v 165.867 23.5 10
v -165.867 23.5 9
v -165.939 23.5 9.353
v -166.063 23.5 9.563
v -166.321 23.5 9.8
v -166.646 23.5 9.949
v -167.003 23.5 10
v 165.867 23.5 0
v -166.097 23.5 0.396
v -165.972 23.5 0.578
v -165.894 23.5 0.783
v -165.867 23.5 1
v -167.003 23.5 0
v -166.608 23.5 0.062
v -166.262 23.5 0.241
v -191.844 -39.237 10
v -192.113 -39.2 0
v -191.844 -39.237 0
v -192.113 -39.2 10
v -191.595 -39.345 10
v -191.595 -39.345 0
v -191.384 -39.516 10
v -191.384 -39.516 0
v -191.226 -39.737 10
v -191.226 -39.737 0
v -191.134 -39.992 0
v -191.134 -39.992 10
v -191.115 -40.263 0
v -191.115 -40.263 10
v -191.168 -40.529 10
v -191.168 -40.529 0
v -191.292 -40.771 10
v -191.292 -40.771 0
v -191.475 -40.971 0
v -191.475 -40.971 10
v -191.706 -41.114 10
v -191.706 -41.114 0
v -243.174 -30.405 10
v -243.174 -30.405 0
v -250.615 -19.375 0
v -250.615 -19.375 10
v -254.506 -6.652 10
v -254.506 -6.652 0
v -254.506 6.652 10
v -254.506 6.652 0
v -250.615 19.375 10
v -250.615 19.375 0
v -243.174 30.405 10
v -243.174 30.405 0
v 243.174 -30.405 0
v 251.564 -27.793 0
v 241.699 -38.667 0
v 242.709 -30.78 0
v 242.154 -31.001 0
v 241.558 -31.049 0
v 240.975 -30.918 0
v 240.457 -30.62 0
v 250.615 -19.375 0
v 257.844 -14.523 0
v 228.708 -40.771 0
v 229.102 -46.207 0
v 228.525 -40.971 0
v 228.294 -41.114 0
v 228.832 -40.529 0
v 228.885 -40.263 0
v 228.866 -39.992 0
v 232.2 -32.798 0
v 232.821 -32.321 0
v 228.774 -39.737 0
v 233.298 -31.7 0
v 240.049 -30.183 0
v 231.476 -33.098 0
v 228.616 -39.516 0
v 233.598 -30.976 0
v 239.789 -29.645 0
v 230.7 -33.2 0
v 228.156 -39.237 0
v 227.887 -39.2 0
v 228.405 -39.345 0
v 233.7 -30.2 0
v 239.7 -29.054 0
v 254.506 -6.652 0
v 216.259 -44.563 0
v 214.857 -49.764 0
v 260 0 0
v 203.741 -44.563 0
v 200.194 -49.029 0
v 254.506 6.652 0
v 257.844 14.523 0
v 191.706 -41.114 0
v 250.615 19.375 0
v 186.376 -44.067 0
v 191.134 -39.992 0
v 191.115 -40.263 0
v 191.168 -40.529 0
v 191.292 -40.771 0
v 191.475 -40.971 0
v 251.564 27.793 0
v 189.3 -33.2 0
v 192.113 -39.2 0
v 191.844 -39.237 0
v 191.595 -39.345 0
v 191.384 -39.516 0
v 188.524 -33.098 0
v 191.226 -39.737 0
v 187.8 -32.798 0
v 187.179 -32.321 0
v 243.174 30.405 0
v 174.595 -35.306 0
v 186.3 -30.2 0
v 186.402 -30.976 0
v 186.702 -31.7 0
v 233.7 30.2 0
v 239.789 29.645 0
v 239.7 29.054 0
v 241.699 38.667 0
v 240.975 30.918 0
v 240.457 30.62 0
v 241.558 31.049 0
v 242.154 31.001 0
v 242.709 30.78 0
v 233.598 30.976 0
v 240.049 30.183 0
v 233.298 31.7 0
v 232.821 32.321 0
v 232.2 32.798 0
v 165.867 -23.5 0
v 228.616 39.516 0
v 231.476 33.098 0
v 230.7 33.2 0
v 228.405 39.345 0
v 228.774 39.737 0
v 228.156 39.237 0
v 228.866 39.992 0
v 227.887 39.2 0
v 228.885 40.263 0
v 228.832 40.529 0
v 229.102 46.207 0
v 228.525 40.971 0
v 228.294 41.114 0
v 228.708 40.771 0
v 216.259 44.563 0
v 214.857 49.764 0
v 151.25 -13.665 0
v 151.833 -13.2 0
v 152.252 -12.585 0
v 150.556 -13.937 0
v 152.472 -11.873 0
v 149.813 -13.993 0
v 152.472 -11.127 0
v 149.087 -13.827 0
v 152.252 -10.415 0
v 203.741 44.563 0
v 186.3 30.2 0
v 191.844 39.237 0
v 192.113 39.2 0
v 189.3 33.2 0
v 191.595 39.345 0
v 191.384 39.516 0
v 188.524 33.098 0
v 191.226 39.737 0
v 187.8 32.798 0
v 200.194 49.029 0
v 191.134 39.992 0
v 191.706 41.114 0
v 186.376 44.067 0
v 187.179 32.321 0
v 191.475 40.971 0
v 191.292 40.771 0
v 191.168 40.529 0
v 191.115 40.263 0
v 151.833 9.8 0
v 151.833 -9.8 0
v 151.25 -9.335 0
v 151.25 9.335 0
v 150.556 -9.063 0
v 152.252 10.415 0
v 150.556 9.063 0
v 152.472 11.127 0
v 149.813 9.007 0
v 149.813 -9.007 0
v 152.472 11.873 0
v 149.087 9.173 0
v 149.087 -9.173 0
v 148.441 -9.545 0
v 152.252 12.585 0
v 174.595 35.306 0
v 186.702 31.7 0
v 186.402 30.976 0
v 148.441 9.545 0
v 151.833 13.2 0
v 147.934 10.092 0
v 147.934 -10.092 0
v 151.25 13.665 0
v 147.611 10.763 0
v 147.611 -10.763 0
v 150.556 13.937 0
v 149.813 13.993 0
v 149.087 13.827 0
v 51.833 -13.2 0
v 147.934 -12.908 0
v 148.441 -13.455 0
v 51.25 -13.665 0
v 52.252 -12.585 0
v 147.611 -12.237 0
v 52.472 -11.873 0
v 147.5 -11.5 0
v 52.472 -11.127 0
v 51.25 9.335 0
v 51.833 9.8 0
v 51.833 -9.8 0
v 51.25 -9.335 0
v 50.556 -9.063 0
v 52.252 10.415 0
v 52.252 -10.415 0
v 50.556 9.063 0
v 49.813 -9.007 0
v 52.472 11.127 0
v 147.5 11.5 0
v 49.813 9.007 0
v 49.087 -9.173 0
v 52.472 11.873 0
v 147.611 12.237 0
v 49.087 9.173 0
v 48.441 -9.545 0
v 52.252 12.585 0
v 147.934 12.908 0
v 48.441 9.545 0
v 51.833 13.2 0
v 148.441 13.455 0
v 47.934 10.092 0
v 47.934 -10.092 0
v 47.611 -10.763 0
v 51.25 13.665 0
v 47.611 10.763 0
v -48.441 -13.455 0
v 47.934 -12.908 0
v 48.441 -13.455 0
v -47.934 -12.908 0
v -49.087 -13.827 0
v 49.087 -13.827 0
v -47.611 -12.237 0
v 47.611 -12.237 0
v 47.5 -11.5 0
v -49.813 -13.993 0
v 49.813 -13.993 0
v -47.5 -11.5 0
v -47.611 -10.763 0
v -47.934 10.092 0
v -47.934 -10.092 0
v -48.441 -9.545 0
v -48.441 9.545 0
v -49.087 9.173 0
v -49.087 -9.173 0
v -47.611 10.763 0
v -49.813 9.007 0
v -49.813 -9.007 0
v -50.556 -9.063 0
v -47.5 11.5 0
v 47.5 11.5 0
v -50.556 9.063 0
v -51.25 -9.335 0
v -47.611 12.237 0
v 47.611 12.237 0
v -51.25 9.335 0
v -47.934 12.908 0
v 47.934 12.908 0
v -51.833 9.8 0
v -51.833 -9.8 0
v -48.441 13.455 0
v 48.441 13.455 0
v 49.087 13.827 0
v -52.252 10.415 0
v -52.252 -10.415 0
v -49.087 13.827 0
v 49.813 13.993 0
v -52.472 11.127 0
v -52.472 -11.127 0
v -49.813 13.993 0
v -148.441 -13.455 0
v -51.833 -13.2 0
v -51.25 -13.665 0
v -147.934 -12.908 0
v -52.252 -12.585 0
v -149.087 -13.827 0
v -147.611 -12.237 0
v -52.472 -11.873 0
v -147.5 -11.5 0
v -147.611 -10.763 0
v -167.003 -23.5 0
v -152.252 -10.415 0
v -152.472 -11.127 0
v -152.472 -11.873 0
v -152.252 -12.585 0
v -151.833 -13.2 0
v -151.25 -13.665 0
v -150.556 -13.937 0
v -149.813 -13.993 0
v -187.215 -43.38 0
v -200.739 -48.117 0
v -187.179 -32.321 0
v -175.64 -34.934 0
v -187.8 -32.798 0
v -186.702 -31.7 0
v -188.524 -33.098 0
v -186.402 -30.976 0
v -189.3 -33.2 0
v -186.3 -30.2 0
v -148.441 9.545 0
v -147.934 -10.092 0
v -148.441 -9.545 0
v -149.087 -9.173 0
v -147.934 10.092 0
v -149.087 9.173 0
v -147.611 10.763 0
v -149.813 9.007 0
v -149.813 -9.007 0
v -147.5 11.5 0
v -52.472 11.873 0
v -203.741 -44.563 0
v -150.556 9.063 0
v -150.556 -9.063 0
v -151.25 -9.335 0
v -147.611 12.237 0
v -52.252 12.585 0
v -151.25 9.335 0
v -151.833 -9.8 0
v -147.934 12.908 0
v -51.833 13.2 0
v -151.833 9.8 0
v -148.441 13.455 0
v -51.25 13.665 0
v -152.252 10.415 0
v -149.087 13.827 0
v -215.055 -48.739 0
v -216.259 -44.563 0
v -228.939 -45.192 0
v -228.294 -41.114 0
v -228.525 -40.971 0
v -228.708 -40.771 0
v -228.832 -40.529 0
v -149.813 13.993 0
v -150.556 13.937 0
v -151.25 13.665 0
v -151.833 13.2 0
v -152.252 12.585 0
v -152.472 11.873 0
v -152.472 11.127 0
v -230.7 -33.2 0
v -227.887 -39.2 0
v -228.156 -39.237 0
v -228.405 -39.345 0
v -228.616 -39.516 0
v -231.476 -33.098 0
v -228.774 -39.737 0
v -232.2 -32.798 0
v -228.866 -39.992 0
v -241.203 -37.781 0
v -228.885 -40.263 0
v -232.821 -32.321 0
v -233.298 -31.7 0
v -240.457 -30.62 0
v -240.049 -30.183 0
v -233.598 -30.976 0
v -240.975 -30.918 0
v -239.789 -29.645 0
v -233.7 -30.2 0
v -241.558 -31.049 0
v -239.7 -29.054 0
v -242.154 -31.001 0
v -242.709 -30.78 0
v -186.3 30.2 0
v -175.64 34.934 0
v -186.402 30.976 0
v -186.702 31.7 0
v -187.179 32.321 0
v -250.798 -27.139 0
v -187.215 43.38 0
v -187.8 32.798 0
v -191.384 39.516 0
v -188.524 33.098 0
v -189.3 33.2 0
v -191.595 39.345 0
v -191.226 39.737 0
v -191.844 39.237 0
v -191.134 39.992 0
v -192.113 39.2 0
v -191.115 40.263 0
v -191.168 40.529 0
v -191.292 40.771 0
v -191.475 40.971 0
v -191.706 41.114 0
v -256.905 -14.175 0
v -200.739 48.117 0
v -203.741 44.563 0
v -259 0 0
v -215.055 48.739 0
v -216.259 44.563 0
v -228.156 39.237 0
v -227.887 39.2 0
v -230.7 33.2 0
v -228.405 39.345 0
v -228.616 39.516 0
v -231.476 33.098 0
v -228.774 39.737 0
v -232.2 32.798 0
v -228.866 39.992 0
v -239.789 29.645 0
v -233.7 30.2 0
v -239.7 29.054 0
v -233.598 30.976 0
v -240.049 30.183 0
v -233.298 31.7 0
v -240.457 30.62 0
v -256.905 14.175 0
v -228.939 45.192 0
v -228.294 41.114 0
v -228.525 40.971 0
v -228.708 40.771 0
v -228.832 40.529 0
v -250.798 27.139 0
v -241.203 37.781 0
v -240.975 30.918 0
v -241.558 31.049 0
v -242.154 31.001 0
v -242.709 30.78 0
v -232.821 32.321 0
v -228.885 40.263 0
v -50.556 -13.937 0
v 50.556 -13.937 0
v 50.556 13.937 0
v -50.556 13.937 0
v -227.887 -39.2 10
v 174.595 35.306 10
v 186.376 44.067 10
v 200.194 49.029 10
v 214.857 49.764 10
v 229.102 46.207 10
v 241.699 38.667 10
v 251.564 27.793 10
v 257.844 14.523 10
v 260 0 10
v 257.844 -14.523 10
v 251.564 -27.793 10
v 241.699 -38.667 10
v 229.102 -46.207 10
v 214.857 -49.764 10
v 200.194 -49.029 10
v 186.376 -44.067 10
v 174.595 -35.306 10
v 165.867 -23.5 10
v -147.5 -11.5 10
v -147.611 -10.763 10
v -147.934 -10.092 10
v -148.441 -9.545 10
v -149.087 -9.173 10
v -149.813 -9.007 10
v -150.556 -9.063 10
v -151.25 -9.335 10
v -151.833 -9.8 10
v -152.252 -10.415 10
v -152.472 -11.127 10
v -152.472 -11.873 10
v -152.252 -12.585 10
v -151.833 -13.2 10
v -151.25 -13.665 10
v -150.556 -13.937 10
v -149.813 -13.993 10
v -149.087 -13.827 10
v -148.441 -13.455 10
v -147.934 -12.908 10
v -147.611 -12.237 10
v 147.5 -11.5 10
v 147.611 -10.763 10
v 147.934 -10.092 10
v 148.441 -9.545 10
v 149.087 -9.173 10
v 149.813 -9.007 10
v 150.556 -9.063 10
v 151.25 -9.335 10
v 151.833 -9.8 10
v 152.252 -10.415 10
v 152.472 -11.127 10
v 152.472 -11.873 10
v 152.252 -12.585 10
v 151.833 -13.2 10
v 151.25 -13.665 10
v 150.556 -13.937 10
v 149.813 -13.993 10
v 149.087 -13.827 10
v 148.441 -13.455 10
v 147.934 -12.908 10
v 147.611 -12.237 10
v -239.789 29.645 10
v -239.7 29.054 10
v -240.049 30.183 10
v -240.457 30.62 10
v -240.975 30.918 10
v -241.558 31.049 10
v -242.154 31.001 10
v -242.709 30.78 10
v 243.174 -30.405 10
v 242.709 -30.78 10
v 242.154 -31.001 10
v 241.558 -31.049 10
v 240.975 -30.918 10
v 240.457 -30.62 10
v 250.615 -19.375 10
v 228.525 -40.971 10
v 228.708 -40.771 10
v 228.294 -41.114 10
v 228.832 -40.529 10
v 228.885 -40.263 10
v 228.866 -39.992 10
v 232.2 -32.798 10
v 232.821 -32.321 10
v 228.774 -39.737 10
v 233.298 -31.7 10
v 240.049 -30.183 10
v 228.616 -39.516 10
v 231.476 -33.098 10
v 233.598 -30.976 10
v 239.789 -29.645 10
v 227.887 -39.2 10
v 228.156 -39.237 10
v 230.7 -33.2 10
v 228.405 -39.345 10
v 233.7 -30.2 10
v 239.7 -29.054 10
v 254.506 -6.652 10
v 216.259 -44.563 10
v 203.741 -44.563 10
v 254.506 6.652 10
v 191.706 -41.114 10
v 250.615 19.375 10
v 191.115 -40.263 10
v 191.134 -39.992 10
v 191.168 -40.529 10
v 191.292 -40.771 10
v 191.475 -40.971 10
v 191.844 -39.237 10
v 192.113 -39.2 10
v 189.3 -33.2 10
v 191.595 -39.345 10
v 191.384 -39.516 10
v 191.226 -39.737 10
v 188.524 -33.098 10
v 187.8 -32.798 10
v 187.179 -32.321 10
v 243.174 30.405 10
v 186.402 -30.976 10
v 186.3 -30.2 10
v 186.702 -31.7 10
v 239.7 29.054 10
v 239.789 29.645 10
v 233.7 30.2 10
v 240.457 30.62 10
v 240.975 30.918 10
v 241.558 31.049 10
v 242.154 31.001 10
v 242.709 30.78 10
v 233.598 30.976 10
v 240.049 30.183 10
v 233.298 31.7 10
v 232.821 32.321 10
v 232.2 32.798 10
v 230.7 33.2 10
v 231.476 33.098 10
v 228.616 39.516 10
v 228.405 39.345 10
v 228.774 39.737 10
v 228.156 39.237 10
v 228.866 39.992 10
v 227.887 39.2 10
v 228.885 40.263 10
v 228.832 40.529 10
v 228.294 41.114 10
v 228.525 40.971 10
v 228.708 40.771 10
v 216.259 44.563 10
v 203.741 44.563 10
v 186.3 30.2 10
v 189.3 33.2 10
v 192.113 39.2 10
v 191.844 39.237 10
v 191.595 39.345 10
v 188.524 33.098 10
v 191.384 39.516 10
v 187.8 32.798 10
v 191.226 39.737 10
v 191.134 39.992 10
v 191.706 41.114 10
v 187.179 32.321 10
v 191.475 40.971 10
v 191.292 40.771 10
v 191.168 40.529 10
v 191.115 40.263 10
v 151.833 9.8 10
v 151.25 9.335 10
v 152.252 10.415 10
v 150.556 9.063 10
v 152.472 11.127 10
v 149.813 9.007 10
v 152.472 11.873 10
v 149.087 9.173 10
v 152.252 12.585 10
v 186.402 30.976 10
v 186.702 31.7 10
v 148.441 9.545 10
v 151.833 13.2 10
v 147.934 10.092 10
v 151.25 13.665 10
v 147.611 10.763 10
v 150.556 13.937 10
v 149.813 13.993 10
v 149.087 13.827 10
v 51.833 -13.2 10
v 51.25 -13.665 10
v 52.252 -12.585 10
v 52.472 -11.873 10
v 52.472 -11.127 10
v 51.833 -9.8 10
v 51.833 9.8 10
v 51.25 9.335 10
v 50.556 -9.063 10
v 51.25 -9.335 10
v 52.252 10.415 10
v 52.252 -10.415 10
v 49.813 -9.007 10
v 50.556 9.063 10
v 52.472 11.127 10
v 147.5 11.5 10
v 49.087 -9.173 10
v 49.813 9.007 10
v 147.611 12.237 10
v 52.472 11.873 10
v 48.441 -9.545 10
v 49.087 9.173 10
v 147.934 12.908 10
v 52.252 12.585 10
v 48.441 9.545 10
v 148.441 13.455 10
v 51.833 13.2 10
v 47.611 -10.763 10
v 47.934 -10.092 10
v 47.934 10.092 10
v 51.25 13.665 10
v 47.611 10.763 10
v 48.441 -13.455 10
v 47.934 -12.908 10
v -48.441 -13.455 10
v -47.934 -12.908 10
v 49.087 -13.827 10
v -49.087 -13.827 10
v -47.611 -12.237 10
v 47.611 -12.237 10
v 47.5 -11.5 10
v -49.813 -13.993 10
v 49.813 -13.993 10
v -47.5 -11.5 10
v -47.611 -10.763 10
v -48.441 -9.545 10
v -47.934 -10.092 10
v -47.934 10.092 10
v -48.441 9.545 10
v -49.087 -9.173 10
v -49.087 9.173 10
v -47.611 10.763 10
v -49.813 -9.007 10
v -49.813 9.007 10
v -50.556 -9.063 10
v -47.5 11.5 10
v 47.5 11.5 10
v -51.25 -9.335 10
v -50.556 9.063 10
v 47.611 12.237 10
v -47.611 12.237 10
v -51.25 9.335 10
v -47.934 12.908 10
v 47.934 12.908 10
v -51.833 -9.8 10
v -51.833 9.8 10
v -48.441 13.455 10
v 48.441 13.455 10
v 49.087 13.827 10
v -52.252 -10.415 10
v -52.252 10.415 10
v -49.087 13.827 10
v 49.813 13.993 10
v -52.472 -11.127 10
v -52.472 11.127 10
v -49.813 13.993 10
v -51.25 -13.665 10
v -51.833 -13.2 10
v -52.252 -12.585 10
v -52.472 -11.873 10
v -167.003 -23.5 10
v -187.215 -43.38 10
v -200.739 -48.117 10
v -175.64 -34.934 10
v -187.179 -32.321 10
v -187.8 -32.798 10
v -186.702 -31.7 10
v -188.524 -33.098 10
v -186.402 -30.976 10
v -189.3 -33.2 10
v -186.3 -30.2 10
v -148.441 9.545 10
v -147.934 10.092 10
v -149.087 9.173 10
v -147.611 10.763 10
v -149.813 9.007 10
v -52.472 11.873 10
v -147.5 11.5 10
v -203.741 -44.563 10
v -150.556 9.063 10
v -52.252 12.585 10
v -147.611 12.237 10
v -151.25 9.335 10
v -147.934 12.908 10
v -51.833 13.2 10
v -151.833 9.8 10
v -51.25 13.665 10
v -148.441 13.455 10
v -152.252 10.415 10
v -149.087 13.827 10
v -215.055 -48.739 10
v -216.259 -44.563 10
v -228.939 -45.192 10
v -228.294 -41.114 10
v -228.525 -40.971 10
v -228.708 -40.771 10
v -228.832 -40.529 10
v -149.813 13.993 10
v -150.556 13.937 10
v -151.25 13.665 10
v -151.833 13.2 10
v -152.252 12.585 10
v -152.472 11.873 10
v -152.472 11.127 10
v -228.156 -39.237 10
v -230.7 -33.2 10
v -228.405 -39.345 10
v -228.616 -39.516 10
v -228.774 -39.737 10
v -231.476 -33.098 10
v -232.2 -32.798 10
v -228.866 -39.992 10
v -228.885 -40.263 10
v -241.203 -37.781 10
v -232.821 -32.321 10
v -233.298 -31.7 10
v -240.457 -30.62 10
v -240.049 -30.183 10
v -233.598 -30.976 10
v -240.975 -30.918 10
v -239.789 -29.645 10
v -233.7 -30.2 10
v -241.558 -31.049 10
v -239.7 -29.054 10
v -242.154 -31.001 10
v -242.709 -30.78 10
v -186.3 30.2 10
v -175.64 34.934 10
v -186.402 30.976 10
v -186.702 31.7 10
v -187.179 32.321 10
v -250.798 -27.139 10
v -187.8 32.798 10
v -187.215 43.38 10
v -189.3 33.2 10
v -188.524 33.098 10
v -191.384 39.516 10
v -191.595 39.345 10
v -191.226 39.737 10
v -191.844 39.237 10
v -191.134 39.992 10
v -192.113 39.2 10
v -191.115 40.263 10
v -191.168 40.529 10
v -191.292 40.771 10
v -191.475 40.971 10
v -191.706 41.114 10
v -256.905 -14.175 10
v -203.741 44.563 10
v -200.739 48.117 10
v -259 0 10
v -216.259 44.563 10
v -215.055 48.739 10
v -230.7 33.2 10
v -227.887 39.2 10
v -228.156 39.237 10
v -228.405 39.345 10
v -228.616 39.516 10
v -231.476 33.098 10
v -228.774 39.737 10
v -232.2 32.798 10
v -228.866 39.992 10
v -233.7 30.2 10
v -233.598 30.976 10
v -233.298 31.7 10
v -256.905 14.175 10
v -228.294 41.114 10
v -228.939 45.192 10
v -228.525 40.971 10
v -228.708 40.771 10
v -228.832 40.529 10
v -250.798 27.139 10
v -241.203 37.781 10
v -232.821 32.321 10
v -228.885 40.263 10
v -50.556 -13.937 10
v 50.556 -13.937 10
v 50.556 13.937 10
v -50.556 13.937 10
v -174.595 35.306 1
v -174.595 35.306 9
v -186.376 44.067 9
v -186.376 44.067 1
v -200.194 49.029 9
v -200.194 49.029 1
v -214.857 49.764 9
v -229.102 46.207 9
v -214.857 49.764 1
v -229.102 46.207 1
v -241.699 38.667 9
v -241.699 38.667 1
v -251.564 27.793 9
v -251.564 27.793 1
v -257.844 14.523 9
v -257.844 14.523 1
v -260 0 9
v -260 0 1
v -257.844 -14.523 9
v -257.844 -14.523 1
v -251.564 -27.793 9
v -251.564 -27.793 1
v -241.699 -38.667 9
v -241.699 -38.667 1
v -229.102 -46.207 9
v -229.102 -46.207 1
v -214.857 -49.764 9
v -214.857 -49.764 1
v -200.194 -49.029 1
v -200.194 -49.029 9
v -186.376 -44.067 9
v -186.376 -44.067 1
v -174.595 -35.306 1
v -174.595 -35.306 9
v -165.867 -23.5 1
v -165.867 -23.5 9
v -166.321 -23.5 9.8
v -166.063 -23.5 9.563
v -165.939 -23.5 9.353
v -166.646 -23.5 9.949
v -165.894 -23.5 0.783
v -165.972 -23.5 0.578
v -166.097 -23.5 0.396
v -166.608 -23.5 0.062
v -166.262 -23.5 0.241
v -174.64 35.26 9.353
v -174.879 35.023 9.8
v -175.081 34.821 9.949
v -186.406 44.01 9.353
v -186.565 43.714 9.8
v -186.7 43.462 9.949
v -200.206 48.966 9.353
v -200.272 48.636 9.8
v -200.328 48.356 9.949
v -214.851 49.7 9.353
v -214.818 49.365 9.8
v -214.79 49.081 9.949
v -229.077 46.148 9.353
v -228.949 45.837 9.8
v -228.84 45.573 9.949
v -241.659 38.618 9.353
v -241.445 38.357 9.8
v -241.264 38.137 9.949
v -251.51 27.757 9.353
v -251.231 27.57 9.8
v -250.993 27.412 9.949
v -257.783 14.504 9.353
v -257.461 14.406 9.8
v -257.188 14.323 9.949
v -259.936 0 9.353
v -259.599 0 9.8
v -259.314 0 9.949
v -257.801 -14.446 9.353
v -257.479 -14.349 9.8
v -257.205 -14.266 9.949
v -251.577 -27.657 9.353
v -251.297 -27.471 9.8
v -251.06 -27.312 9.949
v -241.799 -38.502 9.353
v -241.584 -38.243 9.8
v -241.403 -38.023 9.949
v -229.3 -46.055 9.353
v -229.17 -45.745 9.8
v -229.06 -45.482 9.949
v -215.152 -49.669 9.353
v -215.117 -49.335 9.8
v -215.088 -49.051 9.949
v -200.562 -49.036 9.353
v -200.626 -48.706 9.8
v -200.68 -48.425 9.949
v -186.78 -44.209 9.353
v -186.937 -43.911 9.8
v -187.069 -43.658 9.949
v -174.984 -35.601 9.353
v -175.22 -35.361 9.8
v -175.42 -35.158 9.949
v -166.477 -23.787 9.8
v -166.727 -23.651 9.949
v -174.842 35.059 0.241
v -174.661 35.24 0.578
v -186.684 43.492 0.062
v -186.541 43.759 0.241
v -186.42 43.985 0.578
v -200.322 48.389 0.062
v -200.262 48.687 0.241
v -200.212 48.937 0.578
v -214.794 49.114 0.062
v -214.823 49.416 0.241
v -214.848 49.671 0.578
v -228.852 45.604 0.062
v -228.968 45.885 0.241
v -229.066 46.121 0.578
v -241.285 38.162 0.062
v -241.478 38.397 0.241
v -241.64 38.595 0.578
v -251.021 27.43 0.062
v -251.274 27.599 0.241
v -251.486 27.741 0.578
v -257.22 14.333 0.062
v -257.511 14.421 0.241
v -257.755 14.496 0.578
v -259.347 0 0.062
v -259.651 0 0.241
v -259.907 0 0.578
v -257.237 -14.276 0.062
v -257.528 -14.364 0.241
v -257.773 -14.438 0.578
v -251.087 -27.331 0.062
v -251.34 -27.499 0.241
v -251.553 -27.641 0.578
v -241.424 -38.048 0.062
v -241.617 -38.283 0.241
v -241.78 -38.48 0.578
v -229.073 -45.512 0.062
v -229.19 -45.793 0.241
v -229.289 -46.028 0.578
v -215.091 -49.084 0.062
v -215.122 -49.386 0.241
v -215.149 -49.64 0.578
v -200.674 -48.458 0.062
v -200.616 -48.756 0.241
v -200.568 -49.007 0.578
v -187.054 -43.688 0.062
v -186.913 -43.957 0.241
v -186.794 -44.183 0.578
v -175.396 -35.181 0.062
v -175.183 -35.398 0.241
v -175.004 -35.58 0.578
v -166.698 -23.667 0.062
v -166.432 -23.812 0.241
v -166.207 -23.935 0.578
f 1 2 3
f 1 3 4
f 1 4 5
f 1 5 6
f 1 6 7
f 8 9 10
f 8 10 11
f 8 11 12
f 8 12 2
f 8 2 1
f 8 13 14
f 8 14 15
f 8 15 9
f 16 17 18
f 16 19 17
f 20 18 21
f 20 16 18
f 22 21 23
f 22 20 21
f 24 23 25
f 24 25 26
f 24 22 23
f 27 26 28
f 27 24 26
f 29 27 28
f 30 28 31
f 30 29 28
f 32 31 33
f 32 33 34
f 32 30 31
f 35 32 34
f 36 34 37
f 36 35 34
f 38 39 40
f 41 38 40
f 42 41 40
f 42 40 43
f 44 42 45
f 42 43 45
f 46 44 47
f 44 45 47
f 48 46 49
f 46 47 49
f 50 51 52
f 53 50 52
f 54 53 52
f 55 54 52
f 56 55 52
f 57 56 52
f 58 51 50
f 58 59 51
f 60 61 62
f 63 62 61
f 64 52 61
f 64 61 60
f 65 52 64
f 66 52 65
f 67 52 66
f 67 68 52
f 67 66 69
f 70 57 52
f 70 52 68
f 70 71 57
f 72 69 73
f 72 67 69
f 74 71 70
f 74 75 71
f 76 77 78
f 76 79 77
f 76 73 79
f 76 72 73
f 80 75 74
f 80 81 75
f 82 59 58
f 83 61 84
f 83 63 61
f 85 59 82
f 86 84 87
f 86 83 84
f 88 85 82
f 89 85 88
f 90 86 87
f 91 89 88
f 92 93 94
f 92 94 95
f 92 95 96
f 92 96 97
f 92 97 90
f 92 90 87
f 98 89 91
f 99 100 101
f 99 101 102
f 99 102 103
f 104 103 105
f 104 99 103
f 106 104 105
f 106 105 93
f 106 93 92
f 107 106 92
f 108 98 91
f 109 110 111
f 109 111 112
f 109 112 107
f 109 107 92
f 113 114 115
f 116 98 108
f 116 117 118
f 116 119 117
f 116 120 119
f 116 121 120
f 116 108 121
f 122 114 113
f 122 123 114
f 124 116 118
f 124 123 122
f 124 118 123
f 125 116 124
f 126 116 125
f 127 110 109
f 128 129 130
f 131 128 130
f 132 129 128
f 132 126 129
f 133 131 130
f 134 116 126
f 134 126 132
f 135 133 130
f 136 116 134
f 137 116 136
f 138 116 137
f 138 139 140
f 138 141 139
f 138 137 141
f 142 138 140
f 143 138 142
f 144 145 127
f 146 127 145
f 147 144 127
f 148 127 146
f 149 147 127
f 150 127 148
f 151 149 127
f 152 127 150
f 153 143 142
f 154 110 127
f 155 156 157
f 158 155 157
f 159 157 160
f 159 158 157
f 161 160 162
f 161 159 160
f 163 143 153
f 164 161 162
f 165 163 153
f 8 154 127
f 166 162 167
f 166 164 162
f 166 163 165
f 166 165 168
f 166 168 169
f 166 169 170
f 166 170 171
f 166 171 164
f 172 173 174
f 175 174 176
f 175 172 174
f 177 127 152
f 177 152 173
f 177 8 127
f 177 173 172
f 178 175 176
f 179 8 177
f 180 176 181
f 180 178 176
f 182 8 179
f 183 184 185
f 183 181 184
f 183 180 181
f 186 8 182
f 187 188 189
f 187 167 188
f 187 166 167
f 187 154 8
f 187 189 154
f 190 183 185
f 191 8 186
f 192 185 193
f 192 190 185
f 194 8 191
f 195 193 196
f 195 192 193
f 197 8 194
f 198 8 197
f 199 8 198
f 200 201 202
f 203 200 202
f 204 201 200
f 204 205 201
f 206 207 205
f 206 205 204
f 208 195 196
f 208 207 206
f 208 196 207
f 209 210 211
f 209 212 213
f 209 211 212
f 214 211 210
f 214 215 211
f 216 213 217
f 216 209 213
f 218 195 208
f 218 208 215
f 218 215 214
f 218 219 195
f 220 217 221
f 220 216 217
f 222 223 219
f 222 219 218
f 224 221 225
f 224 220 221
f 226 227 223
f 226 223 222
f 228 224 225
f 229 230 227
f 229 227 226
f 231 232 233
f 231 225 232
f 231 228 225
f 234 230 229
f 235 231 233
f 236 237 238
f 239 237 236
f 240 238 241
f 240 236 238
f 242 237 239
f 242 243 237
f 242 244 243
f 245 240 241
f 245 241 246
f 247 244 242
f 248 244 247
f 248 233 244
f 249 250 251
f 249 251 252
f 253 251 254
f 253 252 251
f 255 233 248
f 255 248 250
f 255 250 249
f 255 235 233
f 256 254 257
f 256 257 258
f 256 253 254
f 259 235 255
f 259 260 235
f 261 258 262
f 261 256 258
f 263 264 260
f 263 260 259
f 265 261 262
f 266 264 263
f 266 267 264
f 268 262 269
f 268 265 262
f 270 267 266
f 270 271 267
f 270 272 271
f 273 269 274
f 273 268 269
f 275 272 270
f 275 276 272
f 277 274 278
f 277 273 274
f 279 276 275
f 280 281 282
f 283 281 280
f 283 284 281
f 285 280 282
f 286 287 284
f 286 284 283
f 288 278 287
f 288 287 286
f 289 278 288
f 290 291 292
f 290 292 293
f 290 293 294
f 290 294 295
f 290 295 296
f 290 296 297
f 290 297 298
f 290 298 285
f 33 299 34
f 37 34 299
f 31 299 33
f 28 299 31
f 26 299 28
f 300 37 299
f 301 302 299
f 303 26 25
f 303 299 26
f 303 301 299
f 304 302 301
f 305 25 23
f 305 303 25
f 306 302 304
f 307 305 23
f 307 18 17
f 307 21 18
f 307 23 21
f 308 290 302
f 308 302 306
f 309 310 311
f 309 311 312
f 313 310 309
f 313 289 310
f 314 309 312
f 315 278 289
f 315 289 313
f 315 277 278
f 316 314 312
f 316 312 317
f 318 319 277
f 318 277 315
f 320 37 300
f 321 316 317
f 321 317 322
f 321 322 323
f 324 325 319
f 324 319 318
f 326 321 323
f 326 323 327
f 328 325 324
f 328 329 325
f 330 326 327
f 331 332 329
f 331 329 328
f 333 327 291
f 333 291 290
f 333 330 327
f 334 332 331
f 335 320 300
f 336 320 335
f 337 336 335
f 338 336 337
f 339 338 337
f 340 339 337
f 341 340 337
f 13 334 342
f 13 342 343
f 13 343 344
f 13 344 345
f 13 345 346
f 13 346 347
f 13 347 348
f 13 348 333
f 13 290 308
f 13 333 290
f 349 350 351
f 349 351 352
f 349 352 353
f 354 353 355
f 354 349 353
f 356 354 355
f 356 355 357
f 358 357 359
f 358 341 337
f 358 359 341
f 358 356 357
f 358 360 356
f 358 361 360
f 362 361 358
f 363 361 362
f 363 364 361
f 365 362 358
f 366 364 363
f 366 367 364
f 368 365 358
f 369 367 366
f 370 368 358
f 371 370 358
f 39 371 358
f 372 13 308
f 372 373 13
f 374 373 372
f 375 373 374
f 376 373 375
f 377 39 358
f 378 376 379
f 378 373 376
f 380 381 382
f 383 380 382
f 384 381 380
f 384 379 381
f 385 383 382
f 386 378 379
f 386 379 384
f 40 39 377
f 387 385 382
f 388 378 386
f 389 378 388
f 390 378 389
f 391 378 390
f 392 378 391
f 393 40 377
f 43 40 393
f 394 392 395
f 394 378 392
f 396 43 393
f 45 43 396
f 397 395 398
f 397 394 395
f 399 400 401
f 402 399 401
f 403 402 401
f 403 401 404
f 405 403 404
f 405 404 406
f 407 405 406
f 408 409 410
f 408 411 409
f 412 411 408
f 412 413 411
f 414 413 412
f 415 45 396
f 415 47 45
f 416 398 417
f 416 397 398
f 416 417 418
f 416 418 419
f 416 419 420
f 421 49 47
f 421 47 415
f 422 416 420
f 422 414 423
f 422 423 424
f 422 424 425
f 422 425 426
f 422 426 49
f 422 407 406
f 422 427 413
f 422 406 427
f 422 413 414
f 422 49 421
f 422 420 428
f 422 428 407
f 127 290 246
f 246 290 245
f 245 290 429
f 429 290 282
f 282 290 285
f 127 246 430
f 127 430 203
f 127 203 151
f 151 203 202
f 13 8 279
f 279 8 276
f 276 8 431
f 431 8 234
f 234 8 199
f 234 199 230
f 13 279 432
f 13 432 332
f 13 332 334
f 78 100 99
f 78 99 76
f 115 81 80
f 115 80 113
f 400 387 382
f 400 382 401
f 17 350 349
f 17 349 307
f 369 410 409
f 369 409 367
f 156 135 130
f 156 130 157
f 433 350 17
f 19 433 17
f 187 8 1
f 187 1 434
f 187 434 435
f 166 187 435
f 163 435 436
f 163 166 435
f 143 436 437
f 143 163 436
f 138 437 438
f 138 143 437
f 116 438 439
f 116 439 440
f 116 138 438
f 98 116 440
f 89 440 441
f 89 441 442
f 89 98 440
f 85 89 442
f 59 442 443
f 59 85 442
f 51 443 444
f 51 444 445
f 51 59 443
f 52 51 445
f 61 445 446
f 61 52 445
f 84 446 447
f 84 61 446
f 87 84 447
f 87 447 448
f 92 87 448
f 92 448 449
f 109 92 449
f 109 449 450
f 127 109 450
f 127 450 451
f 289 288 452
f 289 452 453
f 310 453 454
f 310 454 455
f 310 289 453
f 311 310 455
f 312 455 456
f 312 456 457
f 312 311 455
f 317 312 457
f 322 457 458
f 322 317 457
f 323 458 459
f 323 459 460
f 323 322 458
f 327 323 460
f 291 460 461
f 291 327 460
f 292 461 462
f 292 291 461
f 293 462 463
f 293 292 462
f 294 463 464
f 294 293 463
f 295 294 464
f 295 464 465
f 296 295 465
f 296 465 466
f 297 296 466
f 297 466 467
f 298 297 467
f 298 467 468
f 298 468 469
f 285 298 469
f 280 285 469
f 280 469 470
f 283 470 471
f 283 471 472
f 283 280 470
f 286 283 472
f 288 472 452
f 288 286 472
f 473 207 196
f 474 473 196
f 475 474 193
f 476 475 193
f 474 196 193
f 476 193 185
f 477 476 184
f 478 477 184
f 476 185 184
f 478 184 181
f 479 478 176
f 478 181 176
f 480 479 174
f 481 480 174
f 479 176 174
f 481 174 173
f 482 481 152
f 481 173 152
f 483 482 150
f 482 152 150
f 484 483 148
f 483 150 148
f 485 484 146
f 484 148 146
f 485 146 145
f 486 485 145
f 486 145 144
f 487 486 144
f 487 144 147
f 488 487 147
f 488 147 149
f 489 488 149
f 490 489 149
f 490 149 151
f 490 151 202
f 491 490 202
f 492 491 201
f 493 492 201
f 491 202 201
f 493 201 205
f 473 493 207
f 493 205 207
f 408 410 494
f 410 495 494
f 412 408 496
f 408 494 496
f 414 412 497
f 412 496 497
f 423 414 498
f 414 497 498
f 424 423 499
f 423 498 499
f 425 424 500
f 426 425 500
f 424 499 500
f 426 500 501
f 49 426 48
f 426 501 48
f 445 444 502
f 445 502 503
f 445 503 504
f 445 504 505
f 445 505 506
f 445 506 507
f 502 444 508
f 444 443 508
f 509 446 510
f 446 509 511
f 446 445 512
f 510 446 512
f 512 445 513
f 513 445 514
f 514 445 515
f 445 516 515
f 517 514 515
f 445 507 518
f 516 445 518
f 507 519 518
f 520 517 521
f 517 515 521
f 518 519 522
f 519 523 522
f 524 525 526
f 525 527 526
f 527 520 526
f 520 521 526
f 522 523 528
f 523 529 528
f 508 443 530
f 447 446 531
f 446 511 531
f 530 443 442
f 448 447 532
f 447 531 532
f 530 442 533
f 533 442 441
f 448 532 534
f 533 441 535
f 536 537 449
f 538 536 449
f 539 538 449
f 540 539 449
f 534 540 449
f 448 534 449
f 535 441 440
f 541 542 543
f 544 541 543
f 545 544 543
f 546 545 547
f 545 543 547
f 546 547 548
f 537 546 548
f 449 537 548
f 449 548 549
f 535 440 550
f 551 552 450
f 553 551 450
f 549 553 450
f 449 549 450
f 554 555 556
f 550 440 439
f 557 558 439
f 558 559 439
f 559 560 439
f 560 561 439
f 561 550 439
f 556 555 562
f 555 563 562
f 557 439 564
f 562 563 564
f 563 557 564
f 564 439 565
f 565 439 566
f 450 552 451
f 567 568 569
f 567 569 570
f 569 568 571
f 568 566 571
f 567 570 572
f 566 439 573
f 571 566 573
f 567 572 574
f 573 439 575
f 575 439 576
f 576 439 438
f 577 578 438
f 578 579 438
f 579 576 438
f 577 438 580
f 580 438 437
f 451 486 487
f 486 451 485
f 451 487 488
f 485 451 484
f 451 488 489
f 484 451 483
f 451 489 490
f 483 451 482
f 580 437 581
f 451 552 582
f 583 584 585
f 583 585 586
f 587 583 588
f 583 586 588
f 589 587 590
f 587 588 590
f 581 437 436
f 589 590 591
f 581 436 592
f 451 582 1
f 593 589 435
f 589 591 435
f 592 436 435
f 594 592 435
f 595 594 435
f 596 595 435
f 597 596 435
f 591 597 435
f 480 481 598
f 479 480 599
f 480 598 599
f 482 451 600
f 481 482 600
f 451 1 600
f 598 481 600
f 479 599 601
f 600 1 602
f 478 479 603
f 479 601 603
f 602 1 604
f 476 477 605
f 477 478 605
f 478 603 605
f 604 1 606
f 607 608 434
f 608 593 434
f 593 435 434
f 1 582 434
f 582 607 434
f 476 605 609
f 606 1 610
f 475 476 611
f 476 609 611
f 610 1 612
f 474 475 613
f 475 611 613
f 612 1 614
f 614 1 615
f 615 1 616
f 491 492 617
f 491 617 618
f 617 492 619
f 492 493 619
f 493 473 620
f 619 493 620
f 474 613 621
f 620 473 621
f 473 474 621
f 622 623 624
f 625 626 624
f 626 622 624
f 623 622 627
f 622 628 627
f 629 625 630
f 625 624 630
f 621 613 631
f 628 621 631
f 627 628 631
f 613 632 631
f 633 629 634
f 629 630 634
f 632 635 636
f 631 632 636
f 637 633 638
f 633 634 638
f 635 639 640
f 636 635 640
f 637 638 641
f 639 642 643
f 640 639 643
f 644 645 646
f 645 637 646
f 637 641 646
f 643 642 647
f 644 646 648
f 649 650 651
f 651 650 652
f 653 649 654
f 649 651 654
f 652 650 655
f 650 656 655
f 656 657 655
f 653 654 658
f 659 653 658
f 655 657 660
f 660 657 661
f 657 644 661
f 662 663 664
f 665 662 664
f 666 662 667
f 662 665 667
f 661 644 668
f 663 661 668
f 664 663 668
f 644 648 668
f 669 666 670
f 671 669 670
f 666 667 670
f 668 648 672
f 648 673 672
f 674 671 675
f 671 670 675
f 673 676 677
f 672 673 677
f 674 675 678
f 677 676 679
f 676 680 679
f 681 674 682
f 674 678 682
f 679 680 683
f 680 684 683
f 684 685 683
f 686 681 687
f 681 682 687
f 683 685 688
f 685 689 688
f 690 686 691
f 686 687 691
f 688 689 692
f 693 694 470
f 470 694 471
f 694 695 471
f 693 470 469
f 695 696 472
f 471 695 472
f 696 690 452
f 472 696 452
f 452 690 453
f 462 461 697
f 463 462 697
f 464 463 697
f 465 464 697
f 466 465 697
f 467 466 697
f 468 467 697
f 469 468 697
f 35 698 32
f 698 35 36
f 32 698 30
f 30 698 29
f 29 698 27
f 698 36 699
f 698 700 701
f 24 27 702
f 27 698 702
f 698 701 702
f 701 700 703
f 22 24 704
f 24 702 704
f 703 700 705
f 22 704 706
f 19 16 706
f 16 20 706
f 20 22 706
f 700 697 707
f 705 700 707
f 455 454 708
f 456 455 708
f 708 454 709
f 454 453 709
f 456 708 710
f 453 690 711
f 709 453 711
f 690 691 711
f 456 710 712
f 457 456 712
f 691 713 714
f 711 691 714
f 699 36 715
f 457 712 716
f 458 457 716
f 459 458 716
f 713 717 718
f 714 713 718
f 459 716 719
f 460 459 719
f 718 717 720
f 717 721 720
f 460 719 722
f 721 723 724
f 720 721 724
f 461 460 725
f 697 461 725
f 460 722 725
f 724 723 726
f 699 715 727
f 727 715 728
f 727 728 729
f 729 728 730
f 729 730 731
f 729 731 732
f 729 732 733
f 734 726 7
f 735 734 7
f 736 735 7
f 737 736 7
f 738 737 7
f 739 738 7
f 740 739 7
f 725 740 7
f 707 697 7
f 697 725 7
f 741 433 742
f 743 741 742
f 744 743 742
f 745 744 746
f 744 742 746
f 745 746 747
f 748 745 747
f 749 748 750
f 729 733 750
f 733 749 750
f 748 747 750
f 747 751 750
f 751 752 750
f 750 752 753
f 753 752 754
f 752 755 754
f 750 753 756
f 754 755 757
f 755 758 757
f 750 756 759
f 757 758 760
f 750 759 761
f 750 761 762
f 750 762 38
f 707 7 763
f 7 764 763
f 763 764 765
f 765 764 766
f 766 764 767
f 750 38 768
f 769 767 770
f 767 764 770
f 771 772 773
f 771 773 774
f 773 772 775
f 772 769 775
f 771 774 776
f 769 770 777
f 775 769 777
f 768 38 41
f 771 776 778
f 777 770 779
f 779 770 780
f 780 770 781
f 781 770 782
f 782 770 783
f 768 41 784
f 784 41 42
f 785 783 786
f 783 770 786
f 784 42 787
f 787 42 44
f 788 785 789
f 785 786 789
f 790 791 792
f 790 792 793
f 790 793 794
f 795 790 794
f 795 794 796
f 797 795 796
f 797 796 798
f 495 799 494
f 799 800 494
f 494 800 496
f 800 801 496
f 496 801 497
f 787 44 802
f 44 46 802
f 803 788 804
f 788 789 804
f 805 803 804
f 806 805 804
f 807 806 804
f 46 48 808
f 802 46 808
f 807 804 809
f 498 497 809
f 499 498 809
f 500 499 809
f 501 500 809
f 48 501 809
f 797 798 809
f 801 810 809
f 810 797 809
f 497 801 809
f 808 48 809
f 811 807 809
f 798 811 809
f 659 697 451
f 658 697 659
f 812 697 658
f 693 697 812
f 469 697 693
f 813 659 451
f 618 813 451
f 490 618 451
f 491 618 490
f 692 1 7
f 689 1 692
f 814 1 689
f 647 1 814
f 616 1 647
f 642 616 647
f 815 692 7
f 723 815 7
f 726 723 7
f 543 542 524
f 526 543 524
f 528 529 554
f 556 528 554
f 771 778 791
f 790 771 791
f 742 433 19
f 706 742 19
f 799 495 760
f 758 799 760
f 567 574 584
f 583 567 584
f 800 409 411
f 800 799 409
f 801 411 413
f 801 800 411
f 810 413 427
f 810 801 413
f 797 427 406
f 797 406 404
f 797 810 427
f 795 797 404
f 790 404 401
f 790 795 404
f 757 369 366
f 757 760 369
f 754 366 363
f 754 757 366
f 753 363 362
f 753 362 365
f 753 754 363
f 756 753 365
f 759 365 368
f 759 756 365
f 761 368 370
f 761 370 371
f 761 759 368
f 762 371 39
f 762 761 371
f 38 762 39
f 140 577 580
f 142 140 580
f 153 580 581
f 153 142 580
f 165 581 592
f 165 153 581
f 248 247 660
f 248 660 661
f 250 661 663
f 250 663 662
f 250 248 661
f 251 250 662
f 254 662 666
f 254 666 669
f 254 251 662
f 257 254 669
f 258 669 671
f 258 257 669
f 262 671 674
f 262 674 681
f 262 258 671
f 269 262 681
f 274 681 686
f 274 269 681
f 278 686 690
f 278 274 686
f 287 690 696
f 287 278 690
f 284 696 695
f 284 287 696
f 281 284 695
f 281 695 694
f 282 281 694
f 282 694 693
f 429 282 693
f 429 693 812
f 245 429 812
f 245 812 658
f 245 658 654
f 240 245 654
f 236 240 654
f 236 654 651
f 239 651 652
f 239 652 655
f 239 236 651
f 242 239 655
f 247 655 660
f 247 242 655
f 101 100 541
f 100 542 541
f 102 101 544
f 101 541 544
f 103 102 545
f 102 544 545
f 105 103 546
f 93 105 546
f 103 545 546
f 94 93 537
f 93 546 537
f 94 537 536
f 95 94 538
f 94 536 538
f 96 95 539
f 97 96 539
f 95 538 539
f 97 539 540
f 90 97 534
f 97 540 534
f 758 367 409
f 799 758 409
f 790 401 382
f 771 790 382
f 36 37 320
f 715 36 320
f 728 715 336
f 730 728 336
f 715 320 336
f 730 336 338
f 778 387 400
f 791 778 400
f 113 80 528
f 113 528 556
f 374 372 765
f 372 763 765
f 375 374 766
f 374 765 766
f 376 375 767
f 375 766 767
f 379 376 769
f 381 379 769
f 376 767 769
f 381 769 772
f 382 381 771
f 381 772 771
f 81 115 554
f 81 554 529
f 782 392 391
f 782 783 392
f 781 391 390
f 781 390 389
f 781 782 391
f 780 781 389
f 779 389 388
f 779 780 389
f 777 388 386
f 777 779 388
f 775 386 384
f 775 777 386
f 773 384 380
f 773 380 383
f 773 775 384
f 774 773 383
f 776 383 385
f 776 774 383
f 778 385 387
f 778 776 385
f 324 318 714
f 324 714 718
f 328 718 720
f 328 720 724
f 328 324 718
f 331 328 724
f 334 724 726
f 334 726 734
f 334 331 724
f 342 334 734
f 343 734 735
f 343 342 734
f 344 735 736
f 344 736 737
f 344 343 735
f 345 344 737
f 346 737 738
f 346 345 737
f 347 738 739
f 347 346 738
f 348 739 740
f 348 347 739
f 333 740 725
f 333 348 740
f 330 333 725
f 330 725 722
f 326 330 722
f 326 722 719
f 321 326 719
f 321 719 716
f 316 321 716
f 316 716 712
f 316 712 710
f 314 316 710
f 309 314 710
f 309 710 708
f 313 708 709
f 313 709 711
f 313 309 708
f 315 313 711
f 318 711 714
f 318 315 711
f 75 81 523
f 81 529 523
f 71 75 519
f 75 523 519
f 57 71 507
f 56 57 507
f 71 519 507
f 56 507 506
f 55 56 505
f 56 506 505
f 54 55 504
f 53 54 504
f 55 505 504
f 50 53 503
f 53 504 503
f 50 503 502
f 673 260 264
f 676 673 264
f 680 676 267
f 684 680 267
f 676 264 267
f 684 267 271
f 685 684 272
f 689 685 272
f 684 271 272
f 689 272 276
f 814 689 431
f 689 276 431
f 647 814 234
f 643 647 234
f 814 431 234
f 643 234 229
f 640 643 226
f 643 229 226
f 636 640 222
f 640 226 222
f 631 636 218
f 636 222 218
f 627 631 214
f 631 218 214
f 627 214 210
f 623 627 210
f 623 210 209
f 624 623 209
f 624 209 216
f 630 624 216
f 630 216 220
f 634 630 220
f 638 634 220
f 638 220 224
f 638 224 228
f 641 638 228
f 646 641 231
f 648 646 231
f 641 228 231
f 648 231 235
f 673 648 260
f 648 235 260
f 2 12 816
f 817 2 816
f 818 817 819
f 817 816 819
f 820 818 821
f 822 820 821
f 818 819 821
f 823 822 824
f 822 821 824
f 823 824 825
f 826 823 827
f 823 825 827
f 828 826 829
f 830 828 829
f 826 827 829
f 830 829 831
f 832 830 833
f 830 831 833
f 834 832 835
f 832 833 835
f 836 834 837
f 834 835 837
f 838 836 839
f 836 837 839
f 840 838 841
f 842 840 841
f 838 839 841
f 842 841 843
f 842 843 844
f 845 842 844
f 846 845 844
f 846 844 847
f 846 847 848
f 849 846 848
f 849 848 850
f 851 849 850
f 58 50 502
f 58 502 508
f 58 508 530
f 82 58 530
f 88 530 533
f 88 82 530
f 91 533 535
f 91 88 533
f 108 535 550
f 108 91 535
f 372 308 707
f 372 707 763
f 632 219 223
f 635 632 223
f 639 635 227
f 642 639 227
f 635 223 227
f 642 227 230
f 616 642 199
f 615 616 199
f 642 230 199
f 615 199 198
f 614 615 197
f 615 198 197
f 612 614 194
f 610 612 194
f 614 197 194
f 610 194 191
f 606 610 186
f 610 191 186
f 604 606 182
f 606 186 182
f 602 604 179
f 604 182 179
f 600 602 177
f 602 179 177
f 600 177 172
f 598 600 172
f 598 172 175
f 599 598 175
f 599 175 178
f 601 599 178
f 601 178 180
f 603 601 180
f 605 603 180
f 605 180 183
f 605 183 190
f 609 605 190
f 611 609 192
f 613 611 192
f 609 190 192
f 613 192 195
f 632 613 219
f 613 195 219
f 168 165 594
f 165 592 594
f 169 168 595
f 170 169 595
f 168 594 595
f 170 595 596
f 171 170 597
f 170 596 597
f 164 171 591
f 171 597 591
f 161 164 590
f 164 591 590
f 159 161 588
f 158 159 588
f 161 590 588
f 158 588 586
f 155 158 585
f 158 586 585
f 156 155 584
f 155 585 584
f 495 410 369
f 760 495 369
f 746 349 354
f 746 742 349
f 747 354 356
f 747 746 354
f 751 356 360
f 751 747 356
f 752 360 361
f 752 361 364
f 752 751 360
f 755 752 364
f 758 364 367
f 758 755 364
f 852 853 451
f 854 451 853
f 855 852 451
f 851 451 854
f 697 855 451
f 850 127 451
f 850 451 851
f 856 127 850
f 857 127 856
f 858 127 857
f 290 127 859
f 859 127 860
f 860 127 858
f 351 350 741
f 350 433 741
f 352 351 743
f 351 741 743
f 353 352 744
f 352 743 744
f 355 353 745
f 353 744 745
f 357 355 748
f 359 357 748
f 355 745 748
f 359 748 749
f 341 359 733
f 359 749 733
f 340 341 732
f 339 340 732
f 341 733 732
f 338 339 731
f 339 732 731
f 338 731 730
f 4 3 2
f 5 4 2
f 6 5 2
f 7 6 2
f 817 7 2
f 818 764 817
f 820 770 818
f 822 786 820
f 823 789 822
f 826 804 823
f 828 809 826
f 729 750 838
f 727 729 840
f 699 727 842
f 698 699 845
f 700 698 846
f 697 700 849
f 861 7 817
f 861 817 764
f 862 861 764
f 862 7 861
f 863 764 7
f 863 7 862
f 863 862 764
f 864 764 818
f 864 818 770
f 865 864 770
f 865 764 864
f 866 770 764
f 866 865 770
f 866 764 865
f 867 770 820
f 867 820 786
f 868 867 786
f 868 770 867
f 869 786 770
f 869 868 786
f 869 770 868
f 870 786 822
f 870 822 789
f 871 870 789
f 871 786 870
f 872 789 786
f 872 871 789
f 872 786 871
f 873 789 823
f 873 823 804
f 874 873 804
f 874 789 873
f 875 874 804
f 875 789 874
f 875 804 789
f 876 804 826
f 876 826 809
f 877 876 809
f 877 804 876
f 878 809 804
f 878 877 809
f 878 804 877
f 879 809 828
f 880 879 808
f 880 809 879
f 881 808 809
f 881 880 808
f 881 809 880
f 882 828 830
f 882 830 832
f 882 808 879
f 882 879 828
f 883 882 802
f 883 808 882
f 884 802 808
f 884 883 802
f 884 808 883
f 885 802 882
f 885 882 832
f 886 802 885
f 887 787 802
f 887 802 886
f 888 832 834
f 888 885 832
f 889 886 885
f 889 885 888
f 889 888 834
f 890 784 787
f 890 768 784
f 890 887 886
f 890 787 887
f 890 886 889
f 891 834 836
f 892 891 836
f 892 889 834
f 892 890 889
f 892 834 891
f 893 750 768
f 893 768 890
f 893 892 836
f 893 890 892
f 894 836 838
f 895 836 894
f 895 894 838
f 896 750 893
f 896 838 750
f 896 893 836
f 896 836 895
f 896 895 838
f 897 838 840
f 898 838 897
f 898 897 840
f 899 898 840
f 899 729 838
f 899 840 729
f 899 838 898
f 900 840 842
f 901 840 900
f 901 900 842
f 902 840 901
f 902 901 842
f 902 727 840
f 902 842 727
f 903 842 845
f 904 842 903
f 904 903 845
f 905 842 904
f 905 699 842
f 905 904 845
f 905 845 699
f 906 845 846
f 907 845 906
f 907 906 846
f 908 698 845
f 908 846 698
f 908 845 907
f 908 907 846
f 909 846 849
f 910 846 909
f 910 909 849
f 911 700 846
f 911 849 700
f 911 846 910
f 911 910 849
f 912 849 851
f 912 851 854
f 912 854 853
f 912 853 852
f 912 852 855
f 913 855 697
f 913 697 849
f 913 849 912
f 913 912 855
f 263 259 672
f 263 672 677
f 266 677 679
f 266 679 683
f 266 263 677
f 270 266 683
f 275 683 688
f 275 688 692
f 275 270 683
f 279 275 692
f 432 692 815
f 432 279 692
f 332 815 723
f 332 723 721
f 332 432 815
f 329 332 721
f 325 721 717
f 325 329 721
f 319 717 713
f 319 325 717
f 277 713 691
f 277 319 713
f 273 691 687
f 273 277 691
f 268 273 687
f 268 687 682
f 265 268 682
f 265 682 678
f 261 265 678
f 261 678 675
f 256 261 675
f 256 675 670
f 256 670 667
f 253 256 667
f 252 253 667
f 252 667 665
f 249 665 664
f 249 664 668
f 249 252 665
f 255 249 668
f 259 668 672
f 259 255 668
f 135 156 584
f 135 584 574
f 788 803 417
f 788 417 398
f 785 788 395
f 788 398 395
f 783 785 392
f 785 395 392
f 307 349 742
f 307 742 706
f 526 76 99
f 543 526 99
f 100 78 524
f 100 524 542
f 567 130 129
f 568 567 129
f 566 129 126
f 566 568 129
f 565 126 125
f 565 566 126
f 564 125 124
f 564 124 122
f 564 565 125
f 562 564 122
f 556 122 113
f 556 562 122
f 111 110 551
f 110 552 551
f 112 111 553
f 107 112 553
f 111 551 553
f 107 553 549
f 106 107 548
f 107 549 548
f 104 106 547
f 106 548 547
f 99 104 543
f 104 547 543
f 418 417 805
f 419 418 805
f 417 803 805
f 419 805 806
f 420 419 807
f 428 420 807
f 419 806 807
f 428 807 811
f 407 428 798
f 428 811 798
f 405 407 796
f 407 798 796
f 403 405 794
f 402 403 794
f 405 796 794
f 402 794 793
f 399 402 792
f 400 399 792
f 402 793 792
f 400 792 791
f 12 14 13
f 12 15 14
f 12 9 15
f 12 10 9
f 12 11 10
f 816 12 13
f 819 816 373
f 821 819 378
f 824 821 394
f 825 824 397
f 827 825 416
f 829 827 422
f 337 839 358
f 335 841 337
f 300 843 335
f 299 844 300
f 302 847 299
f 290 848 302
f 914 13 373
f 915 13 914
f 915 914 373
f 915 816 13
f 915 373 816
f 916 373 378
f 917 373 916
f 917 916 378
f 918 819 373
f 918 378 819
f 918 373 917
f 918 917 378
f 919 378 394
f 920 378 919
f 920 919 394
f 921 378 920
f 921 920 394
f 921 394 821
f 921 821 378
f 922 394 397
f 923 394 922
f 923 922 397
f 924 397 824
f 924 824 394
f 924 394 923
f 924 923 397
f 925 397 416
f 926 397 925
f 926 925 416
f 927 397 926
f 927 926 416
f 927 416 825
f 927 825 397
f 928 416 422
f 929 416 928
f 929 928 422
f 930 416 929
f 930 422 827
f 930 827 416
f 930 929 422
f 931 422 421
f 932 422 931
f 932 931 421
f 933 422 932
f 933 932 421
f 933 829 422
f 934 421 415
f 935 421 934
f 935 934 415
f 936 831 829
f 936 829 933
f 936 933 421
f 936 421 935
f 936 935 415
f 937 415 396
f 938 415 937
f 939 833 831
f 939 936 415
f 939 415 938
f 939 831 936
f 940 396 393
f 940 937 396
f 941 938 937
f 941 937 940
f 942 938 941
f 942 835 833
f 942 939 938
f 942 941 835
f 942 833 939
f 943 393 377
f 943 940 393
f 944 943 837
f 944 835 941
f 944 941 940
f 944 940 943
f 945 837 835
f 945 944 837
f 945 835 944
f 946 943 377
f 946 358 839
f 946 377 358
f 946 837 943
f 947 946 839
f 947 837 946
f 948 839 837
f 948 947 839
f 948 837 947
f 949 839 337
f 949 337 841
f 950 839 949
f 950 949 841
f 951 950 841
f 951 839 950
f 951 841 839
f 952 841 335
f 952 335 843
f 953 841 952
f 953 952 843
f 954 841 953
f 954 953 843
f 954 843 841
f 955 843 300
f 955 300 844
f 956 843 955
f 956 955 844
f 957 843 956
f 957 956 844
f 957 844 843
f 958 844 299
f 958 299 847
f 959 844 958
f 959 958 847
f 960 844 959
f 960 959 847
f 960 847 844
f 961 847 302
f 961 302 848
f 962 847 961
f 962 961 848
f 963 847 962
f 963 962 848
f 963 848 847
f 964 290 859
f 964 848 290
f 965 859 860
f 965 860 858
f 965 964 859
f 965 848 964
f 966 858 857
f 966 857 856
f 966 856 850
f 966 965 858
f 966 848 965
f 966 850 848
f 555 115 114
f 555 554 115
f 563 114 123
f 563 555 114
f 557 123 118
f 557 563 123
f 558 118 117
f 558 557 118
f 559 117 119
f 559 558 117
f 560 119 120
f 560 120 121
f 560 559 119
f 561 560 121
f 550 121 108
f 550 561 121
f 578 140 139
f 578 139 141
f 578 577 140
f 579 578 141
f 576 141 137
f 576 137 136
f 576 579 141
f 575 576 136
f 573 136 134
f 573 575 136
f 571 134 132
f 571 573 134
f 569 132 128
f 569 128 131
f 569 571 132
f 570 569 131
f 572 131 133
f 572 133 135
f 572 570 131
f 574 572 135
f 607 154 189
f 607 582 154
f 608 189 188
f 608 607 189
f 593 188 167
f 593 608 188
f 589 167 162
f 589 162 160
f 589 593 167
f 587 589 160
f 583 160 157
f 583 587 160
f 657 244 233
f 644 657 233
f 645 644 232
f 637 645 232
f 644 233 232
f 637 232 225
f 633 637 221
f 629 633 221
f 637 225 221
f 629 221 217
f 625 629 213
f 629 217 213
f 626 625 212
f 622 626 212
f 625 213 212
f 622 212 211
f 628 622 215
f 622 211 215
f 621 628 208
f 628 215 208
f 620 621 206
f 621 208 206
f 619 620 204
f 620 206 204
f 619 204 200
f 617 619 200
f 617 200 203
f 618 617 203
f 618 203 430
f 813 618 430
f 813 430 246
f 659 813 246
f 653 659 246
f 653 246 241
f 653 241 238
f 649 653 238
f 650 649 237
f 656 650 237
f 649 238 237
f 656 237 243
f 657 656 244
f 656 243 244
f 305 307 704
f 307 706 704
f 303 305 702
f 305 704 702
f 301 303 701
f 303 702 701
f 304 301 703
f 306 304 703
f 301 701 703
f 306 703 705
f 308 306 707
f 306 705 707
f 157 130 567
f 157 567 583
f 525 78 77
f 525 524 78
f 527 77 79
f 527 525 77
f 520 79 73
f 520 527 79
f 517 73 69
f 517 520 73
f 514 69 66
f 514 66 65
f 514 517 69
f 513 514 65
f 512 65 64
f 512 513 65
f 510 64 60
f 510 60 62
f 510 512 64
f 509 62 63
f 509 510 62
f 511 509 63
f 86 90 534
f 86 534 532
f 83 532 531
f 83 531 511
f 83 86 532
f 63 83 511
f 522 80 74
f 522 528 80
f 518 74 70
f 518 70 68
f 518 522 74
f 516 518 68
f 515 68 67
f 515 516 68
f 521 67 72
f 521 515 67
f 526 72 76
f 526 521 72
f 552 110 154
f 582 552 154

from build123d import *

# Parameters (mm, degrees)
SKETCH_1_W             = 47.4
SKETCH_1_H             = 66.4
SKETCH_1_R             = 2.5
EXTRUDE_1_DEPTH        = 10
FILLET_1_R             = 3
FILLET_2_R             = 2
FILLET_4_R             = 1
FILLET_5_R             = 1
FILLET_1_OF_MIRROR_1_R = 3
FILLET_2_OF_MIRROR_1_R = 2
FILLET_4_OF_MIRROR_1_R = 1


with BuildPart() as part:
    # 草图1 → 凸台-拉伸1 (new body)
    with BuildSketch(Plane.XY):
        with BuildLine():
            ThreePointArc((-165.866679255, 23.5), (-260, 0), (-165.866679255, -23.5))
            Line((-165.866679255, -23.5), (0, -23.5))
            Line((0, -23.5), (0, 23.5))
            Line((0, 23.5), (-165.866679255, 23.5))
        make_face()
        with BuildLine():
            ThreePointArc((-187.901131251, -39.2), (-210, -45), (-232.098868749, -39.2))
            Line((-232.098868749, -39.2), (-187.901131251, -39.2))
        make_face(mode=Mode.SUBTRACT)
        with BuildLine():
            ThreePointArc((-239.7, -33.806951948), (-255, 0), (-239.7, 33.806951948))
            Line((-239.7, 33.806951948), (-239.7, -33.806951948))
        make_face(mode=Mode.SUBTRACT)
        with Locations((-210, 0)):
            Rectangle(SKETCH_1_W, SKETCH_1_H, mode=Mode.SUBTRACT)
        with BuildLine():
            Line((-187.901131251, 39.2), (-232.098868749, 39.2))
            ThreePointArc((-232.098868749, 39.2), (-210, 45), (-187.901131251, 39.2))
        make_face(mode=Mode.SUBTRACT)
        with Locations((-50, 11.5)):
            Circle(SKETCH_1_R, mode=Mode.SUBTRACT)
        with Locations((-150, 11.5)):
            Circle(SKETCH_1_R, mode=Mode.SUBTRACT)
        with Locations((-150, -11.5)):
            Circle(SKETCH_1_R, mode=Mode.SUBTRACT)
        with Locations((-50, -11.5)):
            Circle(SKETCH_1_R, mode=Mode.SUBTRACT)
    extrude_1 = extrude(amount=EXTRUDE_1_DEPTH)

    # 圆角1
    fillet_1_edges = [part.edges().sort_by_distance(p)[0] for p in [
        (-186.3, 33.2, 5),
        (-233.7, 33.2, 5),
        (-233.7, -33.2, 5),
        (-186.3, -33.2, 5),
    ]]
    fillet(fillet_1_edges, radius=FILLET_1_R)

    # 圆角2
    fillet_2_edges = [part.edges().sort_by_distance(p)[0] for p in [
        (-239.7, 33.806951948, 5),
        (-239.7, -33.806951948, 5),
    ]]
    fillet(fillet_2_edges, radius=FILLET_2_R)

    # 圆角4
    fillet_4_edges = [part.edges().sort_by_distance(p)[0] for p in [
        (-187.901131251, 39.2, 5),
        (-232.098868749, 39.2, 5),
        (-187.901131251, -39.2, 5),
        (-232.098868749, -39.2, 5),
    ]]
    fillet(fillet_4_edges, radius=FILLET_4_R)

    # 圆角5
    fillet_5_edges = [part.edges().sort_by_distance(p)[0] for p in [
        (-260, 0, 10),
        (-260, 0, 0),
    ]]
    fillet(fillet_5_edges, radius=FILLET_5_R)

    # 镜向1: 凸台-拉伸1 across plane
    add(extrude_1.mirror(Plane(origin=(0, 0, 10), x_dir=(0, 0, 1), z_dir=(1, 0, 0))))

    # 圆角1 of 镜向1
    fillet_1_of_mirror_1_edges = [part.edges().sort_by_distance(p)[0] for p in [
        (186.3, 33.2, 5),
        (233.7, 33.2, 5),
        (233.7, -33.2, 5),
        (186.3, -33.2, 5),
    ]]
    fillet(fillet_1_of_mirror_1_edges, radius=FILLET_1_OF_MIRROR_1_R)

    # 圆角2 of 镜向1
    fillet_2_of_mirror_1_edges = [part.edges().sort_by_distance(p)[0] for p in [
        (239.7, 33.806951948, 5),
        (239.7, -33.806951948, 5),
    ]]
    fillet(fillet_2_of_mirror_1_edges, radius=FILLET_2_OF_MIRROR_1_R)

    # 圆角4 of 镜向1
    fillet_4_of_mirror_1_edges = [part.edges().sort_by_distance(p)[0] for p in [
        (187.901131251, 39.2, 5),
        (232.098868749, 39.2, 5),
        (187.901131251, -39.2, 5),
        (232.098868749, -39.2, 5),
    ]]
    fillet(fillet_4_of_mirror_1_edges, radius=FILLET_4_OF_MIRROR_1_R)


solid = part.part
